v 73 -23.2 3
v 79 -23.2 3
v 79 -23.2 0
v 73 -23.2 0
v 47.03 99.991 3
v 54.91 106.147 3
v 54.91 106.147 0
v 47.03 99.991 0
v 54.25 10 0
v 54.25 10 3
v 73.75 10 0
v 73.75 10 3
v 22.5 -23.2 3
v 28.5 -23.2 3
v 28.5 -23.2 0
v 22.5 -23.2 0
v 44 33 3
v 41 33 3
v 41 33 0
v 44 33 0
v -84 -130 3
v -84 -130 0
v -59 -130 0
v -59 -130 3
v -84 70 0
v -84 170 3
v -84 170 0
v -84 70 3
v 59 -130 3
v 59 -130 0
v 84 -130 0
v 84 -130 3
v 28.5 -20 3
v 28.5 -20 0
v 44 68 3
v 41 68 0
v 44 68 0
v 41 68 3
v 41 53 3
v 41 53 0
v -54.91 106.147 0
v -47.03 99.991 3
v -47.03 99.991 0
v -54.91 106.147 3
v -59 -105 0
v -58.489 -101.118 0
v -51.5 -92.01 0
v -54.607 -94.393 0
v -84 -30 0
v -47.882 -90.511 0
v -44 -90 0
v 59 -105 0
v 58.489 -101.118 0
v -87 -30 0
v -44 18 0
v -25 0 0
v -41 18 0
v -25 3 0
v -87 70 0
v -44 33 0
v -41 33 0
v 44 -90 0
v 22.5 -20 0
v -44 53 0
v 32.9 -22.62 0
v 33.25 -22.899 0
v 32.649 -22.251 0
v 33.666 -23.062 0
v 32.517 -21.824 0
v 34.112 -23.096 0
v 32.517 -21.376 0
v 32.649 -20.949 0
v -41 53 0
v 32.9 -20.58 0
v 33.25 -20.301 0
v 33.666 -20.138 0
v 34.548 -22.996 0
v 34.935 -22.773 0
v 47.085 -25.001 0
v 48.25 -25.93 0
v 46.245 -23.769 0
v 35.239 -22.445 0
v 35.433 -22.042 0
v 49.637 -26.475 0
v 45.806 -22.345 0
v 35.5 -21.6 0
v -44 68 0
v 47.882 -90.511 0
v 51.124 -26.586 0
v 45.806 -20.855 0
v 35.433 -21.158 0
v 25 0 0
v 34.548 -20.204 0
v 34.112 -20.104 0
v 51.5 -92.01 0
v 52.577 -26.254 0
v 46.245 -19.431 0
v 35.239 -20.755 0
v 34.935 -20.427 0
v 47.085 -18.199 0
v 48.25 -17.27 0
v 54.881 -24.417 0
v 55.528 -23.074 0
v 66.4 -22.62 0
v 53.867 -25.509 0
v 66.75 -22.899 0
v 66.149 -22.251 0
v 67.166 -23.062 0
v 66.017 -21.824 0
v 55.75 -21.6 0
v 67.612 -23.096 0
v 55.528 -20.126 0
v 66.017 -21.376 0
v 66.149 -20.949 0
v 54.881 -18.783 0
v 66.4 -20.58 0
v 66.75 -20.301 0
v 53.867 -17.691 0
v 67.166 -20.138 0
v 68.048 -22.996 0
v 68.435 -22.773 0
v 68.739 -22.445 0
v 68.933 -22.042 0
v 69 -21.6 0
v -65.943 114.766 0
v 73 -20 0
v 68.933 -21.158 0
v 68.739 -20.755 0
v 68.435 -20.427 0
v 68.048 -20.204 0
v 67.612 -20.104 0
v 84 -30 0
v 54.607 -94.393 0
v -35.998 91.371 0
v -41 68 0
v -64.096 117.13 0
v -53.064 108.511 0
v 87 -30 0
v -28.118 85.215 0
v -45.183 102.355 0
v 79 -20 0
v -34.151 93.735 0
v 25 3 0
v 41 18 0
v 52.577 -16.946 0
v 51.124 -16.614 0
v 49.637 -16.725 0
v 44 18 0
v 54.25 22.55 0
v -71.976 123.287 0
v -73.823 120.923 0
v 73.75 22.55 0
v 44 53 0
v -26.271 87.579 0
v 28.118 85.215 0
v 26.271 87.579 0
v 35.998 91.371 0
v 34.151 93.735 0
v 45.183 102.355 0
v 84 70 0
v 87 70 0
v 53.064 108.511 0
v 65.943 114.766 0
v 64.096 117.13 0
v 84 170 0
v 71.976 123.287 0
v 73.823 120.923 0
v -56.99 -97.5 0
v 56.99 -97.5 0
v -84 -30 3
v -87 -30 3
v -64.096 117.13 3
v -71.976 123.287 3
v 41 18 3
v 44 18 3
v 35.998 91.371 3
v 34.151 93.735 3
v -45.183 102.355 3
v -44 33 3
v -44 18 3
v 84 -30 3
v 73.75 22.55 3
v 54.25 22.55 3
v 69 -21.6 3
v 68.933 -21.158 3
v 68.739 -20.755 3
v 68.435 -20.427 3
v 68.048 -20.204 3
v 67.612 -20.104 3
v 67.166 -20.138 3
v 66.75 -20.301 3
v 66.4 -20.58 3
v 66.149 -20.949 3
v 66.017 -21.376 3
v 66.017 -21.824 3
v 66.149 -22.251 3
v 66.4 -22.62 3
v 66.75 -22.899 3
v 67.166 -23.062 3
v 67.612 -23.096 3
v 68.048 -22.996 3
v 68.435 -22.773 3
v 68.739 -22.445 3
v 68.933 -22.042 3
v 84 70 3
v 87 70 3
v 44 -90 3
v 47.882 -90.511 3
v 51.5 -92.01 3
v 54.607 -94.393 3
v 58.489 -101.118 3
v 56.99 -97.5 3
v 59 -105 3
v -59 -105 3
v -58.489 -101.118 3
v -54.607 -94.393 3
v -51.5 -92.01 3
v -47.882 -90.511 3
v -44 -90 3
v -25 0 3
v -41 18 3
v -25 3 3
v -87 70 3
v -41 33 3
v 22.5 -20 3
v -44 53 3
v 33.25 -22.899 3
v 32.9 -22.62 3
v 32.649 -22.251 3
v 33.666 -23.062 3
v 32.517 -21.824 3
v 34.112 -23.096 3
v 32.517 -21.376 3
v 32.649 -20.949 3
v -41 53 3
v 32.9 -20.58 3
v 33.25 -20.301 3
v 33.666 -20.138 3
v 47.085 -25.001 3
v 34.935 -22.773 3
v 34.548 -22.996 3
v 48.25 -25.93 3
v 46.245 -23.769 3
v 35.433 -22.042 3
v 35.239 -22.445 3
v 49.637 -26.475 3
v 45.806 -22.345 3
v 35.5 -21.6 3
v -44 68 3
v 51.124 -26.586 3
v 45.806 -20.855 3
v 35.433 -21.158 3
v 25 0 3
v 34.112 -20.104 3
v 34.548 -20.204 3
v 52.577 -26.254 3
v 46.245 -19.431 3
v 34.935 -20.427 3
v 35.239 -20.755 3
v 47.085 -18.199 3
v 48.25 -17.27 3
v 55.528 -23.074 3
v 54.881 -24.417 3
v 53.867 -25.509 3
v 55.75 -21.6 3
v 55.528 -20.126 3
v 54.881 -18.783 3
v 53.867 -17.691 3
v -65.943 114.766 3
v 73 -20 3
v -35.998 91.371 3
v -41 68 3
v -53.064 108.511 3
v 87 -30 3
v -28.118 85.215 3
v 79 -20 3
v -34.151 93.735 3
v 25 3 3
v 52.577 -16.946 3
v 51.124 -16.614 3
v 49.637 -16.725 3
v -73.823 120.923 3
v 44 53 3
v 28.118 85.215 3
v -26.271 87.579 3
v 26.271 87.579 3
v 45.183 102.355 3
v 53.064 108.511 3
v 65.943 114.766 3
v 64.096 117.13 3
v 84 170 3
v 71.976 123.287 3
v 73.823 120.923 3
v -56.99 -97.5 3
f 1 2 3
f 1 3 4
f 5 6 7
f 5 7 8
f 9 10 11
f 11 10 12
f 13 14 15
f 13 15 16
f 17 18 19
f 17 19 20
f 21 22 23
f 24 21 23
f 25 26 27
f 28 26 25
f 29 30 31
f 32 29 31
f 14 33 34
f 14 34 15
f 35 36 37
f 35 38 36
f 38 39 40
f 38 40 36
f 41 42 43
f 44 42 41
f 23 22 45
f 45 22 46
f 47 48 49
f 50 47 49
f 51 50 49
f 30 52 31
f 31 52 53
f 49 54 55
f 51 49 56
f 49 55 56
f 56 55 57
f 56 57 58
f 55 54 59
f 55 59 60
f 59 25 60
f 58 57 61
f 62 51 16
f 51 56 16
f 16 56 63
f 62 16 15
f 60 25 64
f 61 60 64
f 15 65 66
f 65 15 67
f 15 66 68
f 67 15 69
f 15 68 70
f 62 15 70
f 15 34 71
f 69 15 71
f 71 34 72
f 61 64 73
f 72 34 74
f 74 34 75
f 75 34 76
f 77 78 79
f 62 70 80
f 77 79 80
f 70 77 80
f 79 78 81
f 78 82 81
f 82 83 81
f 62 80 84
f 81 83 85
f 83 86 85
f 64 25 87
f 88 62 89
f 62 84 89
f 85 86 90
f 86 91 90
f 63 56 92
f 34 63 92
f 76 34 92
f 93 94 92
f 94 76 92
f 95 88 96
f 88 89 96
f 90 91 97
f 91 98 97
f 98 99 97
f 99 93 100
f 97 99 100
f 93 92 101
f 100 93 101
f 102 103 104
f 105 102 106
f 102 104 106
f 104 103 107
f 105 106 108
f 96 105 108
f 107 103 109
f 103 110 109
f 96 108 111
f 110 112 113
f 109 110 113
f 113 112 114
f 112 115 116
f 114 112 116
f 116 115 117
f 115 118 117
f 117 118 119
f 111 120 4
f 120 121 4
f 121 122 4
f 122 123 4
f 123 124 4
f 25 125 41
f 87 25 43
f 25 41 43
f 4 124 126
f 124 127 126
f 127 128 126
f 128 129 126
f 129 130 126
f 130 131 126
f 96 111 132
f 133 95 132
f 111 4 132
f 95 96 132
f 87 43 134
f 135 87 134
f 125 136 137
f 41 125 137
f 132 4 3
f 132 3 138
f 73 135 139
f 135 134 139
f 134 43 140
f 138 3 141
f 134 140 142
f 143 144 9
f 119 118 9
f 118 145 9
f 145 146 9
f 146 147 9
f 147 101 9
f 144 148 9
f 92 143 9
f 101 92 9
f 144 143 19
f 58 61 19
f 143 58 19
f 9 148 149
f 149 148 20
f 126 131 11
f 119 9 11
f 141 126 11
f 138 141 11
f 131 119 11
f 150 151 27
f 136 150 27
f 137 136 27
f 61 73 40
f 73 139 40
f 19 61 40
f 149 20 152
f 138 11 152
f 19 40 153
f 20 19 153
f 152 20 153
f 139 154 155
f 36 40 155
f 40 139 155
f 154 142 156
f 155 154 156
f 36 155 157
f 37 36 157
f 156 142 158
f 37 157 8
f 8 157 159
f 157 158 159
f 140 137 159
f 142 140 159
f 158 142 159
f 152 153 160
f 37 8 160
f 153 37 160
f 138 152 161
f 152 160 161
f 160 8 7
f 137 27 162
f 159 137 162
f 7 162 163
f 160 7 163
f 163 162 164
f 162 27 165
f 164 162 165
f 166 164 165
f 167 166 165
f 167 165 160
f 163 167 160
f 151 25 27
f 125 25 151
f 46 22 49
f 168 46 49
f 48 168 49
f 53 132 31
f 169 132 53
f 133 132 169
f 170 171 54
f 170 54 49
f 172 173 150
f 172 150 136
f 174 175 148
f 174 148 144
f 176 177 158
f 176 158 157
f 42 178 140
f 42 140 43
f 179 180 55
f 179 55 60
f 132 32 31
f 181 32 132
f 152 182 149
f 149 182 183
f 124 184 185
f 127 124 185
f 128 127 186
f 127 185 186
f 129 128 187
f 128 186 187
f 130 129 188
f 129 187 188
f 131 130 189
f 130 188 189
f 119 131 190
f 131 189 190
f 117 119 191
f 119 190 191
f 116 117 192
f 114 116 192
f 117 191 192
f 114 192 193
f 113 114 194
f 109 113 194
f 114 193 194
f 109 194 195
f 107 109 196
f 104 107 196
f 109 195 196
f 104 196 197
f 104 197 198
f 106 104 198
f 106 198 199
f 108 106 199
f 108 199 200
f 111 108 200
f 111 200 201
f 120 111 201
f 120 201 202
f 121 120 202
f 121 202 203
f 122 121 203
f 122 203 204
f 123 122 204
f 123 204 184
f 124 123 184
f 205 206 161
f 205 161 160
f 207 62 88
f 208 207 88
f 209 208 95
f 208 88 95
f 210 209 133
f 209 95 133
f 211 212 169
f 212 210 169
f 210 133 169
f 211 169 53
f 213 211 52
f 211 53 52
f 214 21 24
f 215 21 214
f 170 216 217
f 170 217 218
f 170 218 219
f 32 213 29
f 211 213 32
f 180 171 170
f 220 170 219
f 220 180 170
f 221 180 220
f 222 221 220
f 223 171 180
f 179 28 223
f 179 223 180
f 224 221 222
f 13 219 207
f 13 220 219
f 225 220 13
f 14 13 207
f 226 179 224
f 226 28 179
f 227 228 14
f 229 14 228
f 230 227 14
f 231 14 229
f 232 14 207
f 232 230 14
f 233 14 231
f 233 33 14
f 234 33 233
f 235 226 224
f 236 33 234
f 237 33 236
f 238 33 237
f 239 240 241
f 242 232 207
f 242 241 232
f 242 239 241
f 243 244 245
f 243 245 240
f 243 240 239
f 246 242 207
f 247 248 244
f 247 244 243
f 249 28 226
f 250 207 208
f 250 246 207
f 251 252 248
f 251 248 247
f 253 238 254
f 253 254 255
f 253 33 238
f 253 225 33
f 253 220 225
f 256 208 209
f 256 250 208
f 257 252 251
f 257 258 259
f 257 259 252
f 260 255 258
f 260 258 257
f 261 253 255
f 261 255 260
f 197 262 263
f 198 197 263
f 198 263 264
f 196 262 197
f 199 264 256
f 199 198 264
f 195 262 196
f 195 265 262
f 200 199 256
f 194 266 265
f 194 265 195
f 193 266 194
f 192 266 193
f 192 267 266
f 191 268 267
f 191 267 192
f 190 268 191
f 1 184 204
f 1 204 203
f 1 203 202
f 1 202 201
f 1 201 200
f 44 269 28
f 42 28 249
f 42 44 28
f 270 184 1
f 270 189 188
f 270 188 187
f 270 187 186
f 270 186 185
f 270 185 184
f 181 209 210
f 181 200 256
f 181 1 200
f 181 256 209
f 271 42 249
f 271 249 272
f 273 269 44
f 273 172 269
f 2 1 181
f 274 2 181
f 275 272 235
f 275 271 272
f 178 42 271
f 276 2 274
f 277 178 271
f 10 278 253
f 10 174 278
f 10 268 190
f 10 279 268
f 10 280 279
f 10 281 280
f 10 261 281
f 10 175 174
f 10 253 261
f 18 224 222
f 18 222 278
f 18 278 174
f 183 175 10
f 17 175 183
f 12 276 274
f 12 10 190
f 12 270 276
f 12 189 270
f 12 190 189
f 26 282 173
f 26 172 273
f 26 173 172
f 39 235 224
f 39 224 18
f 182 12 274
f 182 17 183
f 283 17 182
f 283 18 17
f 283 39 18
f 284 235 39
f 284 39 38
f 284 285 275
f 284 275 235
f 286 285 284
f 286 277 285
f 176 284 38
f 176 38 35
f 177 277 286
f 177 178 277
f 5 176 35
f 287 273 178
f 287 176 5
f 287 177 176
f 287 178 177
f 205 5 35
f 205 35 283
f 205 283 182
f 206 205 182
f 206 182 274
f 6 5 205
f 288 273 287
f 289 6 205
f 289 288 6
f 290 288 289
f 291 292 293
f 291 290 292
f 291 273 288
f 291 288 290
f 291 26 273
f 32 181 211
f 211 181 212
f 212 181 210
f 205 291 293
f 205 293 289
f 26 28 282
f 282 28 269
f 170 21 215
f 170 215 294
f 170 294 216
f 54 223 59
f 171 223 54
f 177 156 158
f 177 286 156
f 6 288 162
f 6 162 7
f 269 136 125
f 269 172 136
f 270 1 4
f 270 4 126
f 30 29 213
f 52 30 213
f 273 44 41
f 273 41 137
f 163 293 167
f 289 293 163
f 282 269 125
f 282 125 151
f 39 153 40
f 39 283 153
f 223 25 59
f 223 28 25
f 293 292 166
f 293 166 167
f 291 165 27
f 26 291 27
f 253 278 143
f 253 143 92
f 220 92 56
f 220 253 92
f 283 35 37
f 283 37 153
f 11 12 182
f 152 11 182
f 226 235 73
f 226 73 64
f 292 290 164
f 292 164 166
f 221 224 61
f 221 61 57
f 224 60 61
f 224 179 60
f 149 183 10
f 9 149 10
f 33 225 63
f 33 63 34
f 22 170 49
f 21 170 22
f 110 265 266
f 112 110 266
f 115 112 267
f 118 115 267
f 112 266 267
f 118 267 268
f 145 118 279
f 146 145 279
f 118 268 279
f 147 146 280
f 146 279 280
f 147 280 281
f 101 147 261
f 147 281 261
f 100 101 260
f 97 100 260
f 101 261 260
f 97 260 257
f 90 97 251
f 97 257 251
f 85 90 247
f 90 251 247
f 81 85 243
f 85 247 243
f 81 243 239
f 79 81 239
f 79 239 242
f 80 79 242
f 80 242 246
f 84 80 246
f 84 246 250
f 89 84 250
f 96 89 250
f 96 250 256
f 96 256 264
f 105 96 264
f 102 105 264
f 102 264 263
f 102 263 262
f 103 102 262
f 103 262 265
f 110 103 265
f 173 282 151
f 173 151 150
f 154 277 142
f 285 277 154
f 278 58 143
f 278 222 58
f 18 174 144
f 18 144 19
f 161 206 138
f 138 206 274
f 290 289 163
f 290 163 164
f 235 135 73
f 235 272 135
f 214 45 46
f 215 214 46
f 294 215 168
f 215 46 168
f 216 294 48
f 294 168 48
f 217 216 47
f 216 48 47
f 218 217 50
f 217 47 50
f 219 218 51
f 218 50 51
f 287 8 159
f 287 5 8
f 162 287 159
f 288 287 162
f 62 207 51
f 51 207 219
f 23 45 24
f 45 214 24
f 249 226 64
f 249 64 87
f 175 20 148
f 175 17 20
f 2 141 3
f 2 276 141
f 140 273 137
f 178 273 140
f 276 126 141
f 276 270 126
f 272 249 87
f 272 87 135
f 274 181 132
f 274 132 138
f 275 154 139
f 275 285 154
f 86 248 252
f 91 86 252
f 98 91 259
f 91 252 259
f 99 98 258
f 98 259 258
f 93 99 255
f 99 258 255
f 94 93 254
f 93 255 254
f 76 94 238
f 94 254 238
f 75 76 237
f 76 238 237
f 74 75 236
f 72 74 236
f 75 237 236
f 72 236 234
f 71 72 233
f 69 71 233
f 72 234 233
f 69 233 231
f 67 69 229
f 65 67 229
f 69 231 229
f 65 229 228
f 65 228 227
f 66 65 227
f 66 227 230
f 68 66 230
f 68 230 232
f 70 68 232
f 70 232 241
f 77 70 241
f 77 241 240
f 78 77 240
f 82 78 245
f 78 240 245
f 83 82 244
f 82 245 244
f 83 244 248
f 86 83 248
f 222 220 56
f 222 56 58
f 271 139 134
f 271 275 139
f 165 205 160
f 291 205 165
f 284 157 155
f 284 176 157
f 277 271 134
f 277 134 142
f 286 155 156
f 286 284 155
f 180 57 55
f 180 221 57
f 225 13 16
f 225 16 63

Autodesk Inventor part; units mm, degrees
ref_plane "YZ Plane" through (0, 0, 0) normal (1, 0, 0) x (0, 1, 0)
ref_plane "XZ Plane" through (0, 0, 0) normal (0, 1, 0) x (-1, 0, 0)
ref_plane "XY Plane" through (0, 0, 0) normal (0, 0, 1) x (1, 0, 0)
sketch "Sketch1" plane through (0, 0, 0) normal (0, 0, 1) x (1, 0, 0)
  line L0 (-84, -130) -> (-84, 170) projected
  line L1 (84, -130) -> (84, 170) projected
  line L2 (-84, -130) -> (84, -130)
  line L3 (84, -130) -> (84, 170)
  line L4 (84, 170) -> (-84, 170)
  line L5 (-84, 170) -> (-84, -130)
  point P0 (0, 0)
extrude "Extrusion1" add sketch "Sketch1" along normal blind 3
sketch "Sketch2" plane through (0, 0, 3) normal (0, 0, 1) x (1, 0, 0)
  line L0 (-26.2712, 87.5787) -> (-28.1182, 85.2147)
  line L1 (-28.1182, 85.2147) -> (-35.9983, 91.3713)
  line L2 (-35.9983, 91.3713) -> (-34.1513, 93.7353)
  line L3 (-34.1513, 93.7353) -> (-26.2712, 87.5787)
  line L4 (-54.9105, 106.1472) -> (-53.0636, 108.5112)
  line L5 (-53.0636, 108.5112) -> (-45.1834, 102.3546)
  line L6 (-45.1834, 102.3546) -> (-47.0304, 99.9906)
  line L7 (-47.0304, 99.9906) -> (-54.9105, 106.1472)
  line L8 (-64.0957, 117.1305) -> (-65.9427, 114.7664)
  line L9 (-65.9427, 114.7664) -> (-73.8228, 120.9231)
  line L10 (-73.8228, 120.9231) -> (-71.9758, 123.2871)
  line L11 (-71.9758, 123.2871) -> (-64.0957, 117.1305)
  point P0 (0, 0)
extrude "Extrusion2" cut sketch "Sketch2" against normal blind 10
mirror "Mirror1" about plane through (0, 0, 0) normal (1, 0, 0) of "Extrusion2"
sketch "Sketch3" plane through (0, 0, 3) normal (0, 0, 1) x (1, 0, 0)
  line L0 (44, 18) -> (41, 18)
  line L1 (41, 18) -> (41, 33)
  line L2 (41, 33) -> (44, 33)
  line L3 (44, 33) -> (44, 18)
  line L4 (44, 53) -> (41, 53)
  line L5 (41, 53) -> (41, 68)
  line L6 (41, 68) -> (44, 68)
  line L7 (44, 68) -> (44, 53)
  line L8 (-41, 18) -> (-44, 18)
  line L9 (-44, 18) -> (-44, 33)
  line L10 (-44, 33) -> (-41, 33)
  line L11 (-41, 33) -> (-41, 18)
  line L12 (-41, 53) -> (-44, 53)
  line L13 (-44, 53) -> (-44, 68)
  line L14 (-44, 68) -> (-41, 68)
  line L15 (-41, 68) -> (-41, 53)
  point P0 (0, 0)
extrude "Extrusion3" cut sketch "Sketch3" against normal blind 10
sketch "Sketch4" plane through (0, 0, 3) normal (0, 0, 1) x (1, 0, 0)
  line L0 (84, -130) -> (84, 170) projected
  line L1 (84, 170) -> (87, 170)
  line L2 (87, 170) -> (87, -130)
  line L3 (87, -130) -> (84, -130)
  line L4 (84, -130) -> (84, 170)
  line L5 (-84, -130) -> (84, -130) projected
  line L6 (0, 0) -> (0, -130) construction
  line L7 (-84, -130) -> (-84, 170)
  line L8 (-84, 170) -> (-87, 170)
  line L9 (-87, 170) -> (-87, -130)
  line L10 (-87, -130) -> (-84, -130)
  line L11 (-84, -130) -> (-84, 170)
  dimension "d6" = 3
extrude "Extrusion4" add sketch "Sketch4" against normal up to surface (3 mm away)
sketch "Sketch5" plane through (0, 0, 3) normal (0, 0, 1) x (1, 0, 0)
  line L0 (-87, 170) -> (-84, 170)
  line L1 (-84, 170) -> (-84, 70)
  line L2 (-84, 70) -> (-87, 70)
  line L3 (-87, 70) -> (-87, 170)
  line L4 (-84, -130) -> (-87, -130)
  line L5 (-87, -130) -> (-87, -30)
  line L6 (-87, -30) -> (-84, -30)
  line L7 (-84, -30) -> (-84, -130)
  line L8 (84, 170) -> (87, 170)
  line L9 (87, 170) -> (87, 70)
  line L10 (87, 70) -> (84, 70)
  line L11 (84, 70) -> (84, 170)
  line L12 (87, -130) -> (84, -130)
  line L13 (84, -130) -> (84, -30)
  line L14 (84, -30) -> (87, -30)
  line L15 (87, -30) -> (87, -130)
  point P0 (0, 0)
extrude "Extrusion5" cut sketch "Sketch5" against normal blind 10
sketch "Sketch6" plane through (0, 0, 3) normal (0, 0, 1) x (1, 0, 0)
  line L0 (84, -130) -> (-84, -130) projected
  line L1 (-59, -130) -> (59, -130)
  line L2 (59, -130) -> (59, -90)
  line L3 (59, -90) -> (-59, -90)
  line L4 (-59, -90) -> (-59, -130)
  line L5 (84, -130) -> (84, -30) projected
  line L6 (-84, -30) -> (-84, -130) projected
  point P0 (0, 0)
  dimension "d11" = 40
  dimension "d12" = 25
  dimension "d13" = 25
extrude "Extrusion6" cut sketch "Sketch6" against normal blind 10
fillet "Fillet1" radius 15 2 edges at (-59, -90, 1.5) (59, -90, 1.5)
sketch "Sketch8" plane through (0, 0, 3) normal (0, 0, 1) x (1, 0, 0)
  line L0 (73, -23.2) -> (73, -20)
  line L1 (73, -20) -> (79, -20)
  line L2 (79, -20) -> (79, -23.2)
  line L3 (79, -23.2) -> (73, -23.2)
  line L4 (22.5, -23.2) -> (22.5, -20)
  line L5 (22.5, -20) -> (28.5, -20)
  line L6 (28.5, -20) -> (28.5, -23.2)
  line L7 (28.5, -23.2) -> (22.5, -23.2)
  line L8 (32.5, -23.2) -> (35.5, -23.2) projected
  line L9 (35.5, -23.2) -> (35.5, -20) projected
  line L10 (32.5, -20) -> (35.5, -20) projected
  line L11 (32.5, -23.2) -> (32.5, -20) projected
  line L12 (66, -23.2) -> (69, -23.2) projected
  line L13 (69, -23.2) -> (69, -20) projected
  line L14 (66, -20) -> (69, -20) projected
  line L15 (66, -23.2) -> (66, -20) projected
  line L16 (32.5, -20) -> (35.5, -23.2) construction
  line L17 (69, -23.2) -> (66, -20) construction
  circle A0 centre (67.5, -21.6) radius 1.5
  circle A1 centre (34, -21.6) radius 1.5
  point P0 (0, 0)
  dimension "d33" = 3
  dimension "d34" = 3
extrude "Extrusion8" cut sketch "Sketch8" against normal blind 10 contours L0 L1 L2 L3 | L4 L5 L6 L7 | A1 | A0
sketch "Sketch7" plane through (0, 0, 3) normal (0, 0, 1) x (1, 0, 0)
  line L0 (44, 33) -> (44, 18) projected
  line L1 (44, 18) -> (41, 18) projected
  line L2 (54.25, 10) -> (73.75, 10)
  line L3 (73.75, 10) -> (73.75, 22.55)
  line L4 (73.75, 22.55) -> (54.25, 22.55)
  line L5 (54.25, 22.55) -> (54.25, 10)
  line L6 (54.25, 10) -> (73.75, 22.55) construction
  line L7 (73.75, 10) -> (54.25, 22.55) construction
  line L8 (64, 19.1981) -> (64, 44.4042) construction
  line L9 (87, -30) -> (87, 70) construction
  line L10 (84, -130) -> (84, -30) projected
  line L11 (44, 18) -> (44, 33) construction
  line L12 (44, 19.1981) -> (84, 19.1981) construction
  circle A0 centre (50.75, -21.6) radius 5
  line L13 (28.5, -20) -> (28.5, -23.2) construction
  line L14 (73, -23.2) -> (73, -20) construction
  line L15 (28.5, -23.2) -> (28.5, -20) construction
  line L16 (28.5, -21.6) -> (73, -21.6) construction
  point P0 (0, 0)
  point P1 (64, 16.275)
  point P2 (64, 16.275)
  dimension "d23" = 12.55
  dimension "d24" = 19.5
  dimension "d29" = 8
  dimension "d30" = 10
extrude "Extrusion7" cut sketch "Sketch7" against normal blind 10
sketch "Sketch9" plane through (0, 0, 3) normal (0, 0, 1) x (1, 0, 0)
  line L0 (25, 3) -> (25, 0)
  line L1 (25, 0) -> (-25, 0)
  line L2 (-25, 0) -> (-25, 3)
  line L3 (-25, 3) -> (25, 3)
  point P0 (0, 0)
extrude "Extrusion9" cut sketch "Sketch9" against normal blind 10
properties part number "Pared_Frontal"
